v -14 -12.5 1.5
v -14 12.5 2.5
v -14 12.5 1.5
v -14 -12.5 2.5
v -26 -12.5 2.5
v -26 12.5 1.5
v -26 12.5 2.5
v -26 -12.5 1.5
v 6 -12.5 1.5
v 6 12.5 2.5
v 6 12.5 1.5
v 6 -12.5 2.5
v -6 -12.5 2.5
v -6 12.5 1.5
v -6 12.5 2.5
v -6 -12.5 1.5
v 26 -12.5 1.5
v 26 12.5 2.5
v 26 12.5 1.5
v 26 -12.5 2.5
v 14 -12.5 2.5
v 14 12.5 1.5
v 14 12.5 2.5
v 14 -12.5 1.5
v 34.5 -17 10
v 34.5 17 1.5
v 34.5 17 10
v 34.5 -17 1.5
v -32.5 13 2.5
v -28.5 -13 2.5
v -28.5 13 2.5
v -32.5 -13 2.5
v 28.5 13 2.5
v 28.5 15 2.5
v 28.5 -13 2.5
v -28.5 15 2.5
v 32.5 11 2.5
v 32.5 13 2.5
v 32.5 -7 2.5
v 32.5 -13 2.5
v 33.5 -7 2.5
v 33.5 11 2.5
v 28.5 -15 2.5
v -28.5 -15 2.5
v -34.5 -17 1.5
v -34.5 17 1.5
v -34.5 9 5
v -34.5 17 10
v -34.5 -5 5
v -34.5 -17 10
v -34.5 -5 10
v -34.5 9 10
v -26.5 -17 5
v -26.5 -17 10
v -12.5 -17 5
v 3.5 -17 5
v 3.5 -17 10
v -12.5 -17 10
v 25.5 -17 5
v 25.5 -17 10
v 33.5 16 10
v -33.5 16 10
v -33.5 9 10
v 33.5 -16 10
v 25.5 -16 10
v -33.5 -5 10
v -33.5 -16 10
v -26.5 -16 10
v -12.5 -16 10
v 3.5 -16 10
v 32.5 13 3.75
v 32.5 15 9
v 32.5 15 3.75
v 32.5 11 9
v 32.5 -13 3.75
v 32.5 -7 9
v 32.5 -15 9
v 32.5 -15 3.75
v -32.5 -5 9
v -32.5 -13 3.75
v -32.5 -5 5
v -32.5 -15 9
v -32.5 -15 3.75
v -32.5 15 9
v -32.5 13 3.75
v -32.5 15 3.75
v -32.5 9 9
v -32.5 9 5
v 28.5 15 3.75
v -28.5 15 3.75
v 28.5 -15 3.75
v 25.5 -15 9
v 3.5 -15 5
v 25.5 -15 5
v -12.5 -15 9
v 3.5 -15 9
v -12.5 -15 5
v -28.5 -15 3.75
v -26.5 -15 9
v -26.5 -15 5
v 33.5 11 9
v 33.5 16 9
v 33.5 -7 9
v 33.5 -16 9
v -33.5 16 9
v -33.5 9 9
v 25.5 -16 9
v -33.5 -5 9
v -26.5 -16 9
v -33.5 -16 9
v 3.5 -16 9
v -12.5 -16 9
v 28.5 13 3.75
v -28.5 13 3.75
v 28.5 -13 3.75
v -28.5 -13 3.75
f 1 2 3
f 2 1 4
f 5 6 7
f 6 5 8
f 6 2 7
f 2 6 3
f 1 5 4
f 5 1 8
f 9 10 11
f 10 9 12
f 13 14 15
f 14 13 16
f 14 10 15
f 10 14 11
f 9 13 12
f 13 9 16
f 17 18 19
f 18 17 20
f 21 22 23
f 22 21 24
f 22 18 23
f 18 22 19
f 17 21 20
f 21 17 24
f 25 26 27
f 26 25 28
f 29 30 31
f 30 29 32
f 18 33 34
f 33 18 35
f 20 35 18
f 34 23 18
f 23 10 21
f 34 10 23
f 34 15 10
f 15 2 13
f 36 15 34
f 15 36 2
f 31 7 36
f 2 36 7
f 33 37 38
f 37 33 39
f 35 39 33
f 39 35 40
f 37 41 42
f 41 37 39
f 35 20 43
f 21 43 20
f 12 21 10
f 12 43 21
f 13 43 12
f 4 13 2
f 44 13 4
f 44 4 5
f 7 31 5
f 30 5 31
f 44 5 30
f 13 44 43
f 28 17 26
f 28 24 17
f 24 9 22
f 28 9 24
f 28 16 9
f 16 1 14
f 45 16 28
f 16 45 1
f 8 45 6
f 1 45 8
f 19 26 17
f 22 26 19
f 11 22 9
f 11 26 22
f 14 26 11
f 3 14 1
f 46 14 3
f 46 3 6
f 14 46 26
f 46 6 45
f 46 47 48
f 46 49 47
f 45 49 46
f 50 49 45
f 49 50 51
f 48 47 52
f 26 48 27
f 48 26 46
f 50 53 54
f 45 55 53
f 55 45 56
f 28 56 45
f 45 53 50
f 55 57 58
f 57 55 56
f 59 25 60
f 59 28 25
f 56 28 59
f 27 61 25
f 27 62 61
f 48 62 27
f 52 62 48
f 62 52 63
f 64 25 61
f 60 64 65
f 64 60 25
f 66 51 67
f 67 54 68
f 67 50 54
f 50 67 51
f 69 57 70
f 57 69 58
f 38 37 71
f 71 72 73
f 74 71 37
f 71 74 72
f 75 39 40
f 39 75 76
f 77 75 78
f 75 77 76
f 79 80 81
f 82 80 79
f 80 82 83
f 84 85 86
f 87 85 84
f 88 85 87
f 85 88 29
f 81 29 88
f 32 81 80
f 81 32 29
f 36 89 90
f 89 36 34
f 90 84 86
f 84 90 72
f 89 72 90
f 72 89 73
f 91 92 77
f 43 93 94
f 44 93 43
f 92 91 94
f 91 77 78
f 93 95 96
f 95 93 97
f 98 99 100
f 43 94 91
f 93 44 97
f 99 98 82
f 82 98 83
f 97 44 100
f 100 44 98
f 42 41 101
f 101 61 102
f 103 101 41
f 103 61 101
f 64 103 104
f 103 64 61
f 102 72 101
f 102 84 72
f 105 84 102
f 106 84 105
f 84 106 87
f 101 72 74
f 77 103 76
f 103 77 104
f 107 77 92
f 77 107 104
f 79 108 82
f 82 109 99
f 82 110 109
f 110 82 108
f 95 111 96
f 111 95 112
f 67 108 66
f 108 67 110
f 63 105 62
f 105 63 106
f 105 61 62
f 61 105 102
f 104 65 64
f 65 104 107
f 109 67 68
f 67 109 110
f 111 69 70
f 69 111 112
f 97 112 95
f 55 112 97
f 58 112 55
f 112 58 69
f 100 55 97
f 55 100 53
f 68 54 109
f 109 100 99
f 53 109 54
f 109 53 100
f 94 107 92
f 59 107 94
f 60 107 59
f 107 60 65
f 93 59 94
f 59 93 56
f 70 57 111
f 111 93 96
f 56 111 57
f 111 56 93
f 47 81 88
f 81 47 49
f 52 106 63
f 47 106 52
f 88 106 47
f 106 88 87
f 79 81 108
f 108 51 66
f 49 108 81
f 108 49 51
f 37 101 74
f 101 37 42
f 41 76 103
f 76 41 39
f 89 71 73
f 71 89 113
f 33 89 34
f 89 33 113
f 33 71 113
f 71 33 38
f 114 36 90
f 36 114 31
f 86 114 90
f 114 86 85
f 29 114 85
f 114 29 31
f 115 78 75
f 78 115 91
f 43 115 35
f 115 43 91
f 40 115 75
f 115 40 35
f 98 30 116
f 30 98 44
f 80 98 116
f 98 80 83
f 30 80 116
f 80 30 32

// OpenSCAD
//Bottom
translate([0,0,2]) 
{
    difference()
    {
        cube([69,34,1], true);
        for (i=[-40:20:0])
        {
            echo(i);
            translate([i,0,0])
            {
                cube([12,25,2], true);
            }
            i = i + 20;
        }
    }
}

//Sides
translate([0,0,6]) 
{
    difference()
    {
        cube([69,34,8], true);
        cube([65,30,8], true);
        //Еdge
        translate([0,0,4])
            cube([67,32,2], true);
        //Place for the miniHDMI
        translate([-19.5,-15,4])
            cube([14,32,10], true);
        //Place for the two microUSBs
        translate([14.5,-15,4])
            cube([22,32,10], true);
        //microSD card
        translate([-33.5,2,4])
            cube([2,14,10], true);
        //Leave space for the camera
        translate([33,2,1])
            cube([1,18,10], true);
    }
}


//Holders
translate([30.5,14,3])
    cube([4,2,1.5], true);
translate([-30.5,14,3])
    cube([4,2,1.5], true);

translate([30.5,-14,3])
    cube([4,2,1.5], true);
translate([-30.5,-14,3])
    cube([4,2,1.5], true);
